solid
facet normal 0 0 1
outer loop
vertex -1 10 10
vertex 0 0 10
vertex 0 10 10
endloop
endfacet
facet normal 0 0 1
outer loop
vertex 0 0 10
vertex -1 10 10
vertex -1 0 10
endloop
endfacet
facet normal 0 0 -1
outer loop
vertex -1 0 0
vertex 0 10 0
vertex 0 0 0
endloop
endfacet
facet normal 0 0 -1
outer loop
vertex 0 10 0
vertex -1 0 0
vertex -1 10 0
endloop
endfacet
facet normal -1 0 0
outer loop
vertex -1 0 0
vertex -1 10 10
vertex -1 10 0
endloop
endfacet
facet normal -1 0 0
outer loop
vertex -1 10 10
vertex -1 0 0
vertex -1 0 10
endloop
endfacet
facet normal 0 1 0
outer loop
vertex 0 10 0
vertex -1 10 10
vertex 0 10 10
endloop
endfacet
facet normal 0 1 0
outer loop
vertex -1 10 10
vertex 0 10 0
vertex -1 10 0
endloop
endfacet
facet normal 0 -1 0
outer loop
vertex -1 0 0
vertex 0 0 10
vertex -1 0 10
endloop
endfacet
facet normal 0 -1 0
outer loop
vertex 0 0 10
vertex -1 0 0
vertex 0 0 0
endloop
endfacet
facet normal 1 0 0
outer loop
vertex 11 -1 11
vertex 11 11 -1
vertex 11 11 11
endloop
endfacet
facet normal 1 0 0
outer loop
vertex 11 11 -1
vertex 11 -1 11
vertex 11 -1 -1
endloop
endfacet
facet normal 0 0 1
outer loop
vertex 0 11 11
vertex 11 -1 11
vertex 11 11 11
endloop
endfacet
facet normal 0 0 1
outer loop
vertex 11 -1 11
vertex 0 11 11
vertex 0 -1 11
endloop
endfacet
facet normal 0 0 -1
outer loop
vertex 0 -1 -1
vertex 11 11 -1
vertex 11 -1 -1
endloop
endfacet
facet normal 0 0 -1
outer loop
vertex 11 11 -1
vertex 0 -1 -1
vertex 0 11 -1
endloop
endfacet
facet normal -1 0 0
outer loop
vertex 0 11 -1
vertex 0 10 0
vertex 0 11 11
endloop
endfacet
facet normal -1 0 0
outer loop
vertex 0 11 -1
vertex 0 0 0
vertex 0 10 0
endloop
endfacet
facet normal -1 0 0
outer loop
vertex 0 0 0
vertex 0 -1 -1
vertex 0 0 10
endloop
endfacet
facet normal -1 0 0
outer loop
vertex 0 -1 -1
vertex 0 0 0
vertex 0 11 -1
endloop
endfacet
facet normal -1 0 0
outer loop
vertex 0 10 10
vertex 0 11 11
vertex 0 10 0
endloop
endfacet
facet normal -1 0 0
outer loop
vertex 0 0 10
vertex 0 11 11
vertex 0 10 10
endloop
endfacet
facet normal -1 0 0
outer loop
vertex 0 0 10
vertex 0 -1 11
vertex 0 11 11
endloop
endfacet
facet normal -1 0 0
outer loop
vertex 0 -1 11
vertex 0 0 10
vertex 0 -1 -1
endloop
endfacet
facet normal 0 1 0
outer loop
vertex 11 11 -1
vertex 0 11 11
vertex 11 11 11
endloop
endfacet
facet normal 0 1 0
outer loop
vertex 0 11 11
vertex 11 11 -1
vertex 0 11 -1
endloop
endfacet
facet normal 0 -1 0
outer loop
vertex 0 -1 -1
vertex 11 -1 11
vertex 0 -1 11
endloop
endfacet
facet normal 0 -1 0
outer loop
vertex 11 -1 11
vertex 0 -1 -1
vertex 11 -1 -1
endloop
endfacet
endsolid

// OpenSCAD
// Unit of length: Unit.MM
union()
{
   color(c = [1.0, 0.0, 0.0, 1.0])
   {
      translate(v = [-1.0, 0.0, 0.0])
      {
         cube(size = [11.0, 10.0, 10.0], center = false);
      }
   }
   translate(v = [0.0, -1.0, -1.0])
   {
      cube(size = [11.0, 12.0, 12.0], center = false);
   }
}
